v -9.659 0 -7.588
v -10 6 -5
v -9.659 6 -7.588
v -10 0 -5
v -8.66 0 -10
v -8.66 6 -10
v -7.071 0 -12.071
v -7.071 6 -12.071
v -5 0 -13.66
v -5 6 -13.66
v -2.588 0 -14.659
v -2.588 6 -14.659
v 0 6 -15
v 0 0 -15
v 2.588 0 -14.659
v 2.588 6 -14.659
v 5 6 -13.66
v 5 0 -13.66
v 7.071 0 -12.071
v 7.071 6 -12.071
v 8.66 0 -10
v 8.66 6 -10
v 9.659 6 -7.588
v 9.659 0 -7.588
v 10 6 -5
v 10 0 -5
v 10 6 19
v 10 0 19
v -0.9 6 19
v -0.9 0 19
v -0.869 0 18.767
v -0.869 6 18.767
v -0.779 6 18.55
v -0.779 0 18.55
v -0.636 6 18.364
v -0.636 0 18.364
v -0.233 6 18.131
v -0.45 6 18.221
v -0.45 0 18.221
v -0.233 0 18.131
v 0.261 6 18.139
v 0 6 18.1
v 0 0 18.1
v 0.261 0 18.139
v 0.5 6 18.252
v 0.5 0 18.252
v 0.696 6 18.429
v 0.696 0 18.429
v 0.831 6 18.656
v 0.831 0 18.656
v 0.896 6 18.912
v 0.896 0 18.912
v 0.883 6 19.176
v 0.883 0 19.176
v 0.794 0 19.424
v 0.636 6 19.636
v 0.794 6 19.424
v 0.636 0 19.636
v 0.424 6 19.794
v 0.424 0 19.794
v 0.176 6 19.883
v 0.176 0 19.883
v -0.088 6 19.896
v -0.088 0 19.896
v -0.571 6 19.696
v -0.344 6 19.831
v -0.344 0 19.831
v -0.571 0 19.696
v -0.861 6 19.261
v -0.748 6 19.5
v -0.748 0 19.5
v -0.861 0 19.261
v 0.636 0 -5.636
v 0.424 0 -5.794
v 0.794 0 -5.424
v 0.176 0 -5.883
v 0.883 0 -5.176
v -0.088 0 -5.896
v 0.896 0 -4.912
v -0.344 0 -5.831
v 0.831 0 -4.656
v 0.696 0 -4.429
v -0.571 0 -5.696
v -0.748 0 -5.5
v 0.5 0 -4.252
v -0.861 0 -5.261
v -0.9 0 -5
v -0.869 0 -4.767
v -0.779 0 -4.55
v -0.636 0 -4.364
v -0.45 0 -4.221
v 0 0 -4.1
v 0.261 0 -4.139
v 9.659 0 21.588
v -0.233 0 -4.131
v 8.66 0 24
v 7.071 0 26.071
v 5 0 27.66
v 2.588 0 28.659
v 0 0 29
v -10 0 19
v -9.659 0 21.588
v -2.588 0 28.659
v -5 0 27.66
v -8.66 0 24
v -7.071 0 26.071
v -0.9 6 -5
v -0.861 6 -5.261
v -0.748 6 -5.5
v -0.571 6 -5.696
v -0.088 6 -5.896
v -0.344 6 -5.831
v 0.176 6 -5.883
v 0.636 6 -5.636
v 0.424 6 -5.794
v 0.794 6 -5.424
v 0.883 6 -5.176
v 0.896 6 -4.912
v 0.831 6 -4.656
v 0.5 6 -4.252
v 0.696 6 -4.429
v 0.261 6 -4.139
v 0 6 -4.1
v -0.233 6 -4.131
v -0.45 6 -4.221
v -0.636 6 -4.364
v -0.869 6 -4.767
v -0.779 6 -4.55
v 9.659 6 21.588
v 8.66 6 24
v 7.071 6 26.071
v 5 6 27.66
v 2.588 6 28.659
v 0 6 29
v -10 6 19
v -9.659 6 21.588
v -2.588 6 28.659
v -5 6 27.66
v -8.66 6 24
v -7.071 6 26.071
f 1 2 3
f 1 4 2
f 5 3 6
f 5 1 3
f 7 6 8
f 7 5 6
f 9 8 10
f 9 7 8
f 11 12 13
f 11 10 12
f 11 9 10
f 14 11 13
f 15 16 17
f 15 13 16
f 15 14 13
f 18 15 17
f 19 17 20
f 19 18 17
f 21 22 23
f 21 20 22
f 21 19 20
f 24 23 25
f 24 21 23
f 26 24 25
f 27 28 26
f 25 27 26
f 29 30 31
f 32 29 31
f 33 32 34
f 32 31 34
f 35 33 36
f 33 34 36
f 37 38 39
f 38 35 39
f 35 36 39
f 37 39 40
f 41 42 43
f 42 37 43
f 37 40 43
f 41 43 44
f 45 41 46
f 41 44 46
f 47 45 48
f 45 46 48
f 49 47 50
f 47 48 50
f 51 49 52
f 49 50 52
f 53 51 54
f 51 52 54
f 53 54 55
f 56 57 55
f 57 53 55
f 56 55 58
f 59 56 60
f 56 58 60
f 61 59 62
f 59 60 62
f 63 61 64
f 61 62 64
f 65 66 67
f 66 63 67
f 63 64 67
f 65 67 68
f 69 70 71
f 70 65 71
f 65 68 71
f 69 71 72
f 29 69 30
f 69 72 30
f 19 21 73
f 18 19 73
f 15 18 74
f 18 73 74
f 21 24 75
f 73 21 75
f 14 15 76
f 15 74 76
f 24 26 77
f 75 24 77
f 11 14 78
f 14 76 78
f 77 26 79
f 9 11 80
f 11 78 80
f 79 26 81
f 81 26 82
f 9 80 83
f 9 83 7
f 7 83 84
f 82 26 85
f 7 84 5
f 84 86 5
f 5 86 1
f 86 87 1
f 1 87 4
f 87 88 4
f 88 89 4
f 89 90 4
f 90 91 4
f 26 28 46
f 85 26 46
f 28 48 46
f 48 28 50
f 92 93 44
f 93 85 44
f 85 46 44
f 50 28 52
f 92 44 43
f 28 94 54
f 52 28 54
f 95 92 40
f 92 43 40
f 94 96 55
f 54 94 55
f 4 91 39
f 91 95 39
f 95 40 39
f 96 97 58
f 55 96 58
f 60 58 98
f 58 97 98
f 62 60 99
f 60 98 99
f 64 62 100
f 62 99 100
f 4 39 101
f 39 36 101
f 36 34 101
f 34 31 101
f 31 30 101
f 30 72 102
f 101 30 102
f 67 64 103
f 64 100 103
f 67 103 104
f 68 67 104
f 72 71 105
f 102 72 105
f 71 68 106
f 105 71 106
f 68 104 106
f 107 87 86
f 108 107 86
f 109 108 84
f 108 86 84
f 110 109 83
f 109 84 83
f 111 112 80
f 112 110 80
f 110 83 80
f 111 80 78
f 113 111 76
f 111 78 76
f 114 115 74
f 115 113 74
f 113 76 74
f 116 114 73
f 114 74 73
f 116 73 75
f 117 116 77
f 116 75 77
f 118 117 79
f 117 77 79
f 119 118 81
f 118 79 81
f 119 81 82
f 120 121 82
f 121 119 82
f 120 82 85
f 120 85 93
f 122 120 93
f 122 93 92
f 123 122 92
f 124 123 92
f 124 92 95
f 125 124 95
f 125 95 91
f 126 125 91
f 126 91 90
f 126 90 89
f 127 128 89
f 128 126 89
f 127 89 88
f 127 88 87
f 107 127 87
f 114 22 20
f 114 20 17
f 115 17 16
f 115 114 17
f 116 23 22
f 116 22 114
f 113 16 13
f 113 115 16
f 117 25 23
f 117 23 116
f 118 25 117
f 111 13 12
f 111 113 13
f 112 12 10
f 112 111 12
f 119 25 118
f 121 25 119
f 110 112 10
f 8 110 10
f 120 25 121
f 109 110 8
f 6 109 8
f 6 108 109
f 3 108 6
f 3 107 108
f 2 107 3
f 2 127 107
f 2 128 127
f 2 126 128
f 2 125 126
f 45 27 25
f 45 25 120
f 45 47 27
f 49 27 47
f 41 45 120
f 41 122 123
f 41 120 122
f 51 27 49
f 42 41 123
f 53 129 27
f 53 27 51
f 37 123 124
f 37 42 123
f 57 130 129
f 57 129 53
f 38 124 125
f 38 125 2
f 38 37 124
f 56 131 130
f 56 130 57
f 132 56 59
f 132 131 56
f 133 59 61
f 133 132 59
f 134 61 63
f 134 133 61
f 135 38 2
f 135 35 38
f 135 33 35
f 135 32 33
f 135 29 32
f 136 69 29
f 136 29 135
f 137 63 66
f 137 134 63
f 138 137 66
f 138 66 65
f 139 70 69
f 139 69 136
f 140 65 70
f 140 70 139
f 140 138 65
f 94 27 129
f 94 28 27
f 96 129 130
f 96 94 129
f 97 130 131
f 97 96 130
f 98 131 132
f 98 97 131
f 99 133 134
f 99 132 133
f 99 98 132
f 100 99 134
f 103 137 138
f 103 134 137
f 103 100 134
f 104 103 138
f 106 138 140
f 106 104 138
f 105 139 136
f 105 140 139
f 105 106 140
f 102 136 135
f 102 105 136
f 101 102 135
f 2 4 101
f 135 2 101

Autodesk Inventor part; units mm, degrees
ref_plane "YZ Plane" through (0, 0, 0) normal (1, 0, 0) x (0, 1, 0)
ref_plane "XZ Plane" through (0, 0, 0) normal (0, 1, 0) x (-1, 0, 0)
ref_plane "XY Plane" through (0, 0, 0) normal (0, 0, 1) x (1, 0, 0)
sketch "Sketch1" plane through (0, 0, 0) normal (0, 1, 0) x (-1, 0, 0)
  line L0 (0, 0) -> (-5.6352, 0)
  line L1 (-5.6352, 0) -> (0, 0)
  line L2 (0, 0) -> (0, 8.7024)
  line L3 (6.5, 14) -> (-6.5, 14)
  line L4 (-6.5, 14) -> (-6.5, 0)
  line L5 (-6.5, 0) -> (6.5, 0)
  line L6 (6.5, 0) -> (6.5, 14)
  circle A0 centre (0, -5) radius 0.9
  circle A1 centre (0, 19) radius 0.9
  line L7 (0, 19) -> (0, -5)
  line L8 (0, 19) -> (0, -5) construction
  line L9 (-10, 19) -> (-10, -5)
  line L10 (10, -5) -> (10, 19)
  arc A2 (10, 19) -> (-10, 19) centre (0, 19) ccw
  arc A3 (-10, -5) -> (10, -5) centre (0, -5) ccw
  point P0 (0, -8.7024)
  point P1 (0, 7)
  dimension "d25" = 13
  dimension "d26" = 14
  dimension "d30" = 5
  dimension "d31" = 5
  dimension "d32" = 1.8
  dimension "d33" = 20
extrude "Extrusion1" add sketch "Sketch1" along normal blind 6 contours L0 L5 L4 L3 L7 L2 | L2 L7 L3 L6 L5 | A2 L10 A3 L9
properties part number "case_usb_cap" material "Acrylic, Clear"
